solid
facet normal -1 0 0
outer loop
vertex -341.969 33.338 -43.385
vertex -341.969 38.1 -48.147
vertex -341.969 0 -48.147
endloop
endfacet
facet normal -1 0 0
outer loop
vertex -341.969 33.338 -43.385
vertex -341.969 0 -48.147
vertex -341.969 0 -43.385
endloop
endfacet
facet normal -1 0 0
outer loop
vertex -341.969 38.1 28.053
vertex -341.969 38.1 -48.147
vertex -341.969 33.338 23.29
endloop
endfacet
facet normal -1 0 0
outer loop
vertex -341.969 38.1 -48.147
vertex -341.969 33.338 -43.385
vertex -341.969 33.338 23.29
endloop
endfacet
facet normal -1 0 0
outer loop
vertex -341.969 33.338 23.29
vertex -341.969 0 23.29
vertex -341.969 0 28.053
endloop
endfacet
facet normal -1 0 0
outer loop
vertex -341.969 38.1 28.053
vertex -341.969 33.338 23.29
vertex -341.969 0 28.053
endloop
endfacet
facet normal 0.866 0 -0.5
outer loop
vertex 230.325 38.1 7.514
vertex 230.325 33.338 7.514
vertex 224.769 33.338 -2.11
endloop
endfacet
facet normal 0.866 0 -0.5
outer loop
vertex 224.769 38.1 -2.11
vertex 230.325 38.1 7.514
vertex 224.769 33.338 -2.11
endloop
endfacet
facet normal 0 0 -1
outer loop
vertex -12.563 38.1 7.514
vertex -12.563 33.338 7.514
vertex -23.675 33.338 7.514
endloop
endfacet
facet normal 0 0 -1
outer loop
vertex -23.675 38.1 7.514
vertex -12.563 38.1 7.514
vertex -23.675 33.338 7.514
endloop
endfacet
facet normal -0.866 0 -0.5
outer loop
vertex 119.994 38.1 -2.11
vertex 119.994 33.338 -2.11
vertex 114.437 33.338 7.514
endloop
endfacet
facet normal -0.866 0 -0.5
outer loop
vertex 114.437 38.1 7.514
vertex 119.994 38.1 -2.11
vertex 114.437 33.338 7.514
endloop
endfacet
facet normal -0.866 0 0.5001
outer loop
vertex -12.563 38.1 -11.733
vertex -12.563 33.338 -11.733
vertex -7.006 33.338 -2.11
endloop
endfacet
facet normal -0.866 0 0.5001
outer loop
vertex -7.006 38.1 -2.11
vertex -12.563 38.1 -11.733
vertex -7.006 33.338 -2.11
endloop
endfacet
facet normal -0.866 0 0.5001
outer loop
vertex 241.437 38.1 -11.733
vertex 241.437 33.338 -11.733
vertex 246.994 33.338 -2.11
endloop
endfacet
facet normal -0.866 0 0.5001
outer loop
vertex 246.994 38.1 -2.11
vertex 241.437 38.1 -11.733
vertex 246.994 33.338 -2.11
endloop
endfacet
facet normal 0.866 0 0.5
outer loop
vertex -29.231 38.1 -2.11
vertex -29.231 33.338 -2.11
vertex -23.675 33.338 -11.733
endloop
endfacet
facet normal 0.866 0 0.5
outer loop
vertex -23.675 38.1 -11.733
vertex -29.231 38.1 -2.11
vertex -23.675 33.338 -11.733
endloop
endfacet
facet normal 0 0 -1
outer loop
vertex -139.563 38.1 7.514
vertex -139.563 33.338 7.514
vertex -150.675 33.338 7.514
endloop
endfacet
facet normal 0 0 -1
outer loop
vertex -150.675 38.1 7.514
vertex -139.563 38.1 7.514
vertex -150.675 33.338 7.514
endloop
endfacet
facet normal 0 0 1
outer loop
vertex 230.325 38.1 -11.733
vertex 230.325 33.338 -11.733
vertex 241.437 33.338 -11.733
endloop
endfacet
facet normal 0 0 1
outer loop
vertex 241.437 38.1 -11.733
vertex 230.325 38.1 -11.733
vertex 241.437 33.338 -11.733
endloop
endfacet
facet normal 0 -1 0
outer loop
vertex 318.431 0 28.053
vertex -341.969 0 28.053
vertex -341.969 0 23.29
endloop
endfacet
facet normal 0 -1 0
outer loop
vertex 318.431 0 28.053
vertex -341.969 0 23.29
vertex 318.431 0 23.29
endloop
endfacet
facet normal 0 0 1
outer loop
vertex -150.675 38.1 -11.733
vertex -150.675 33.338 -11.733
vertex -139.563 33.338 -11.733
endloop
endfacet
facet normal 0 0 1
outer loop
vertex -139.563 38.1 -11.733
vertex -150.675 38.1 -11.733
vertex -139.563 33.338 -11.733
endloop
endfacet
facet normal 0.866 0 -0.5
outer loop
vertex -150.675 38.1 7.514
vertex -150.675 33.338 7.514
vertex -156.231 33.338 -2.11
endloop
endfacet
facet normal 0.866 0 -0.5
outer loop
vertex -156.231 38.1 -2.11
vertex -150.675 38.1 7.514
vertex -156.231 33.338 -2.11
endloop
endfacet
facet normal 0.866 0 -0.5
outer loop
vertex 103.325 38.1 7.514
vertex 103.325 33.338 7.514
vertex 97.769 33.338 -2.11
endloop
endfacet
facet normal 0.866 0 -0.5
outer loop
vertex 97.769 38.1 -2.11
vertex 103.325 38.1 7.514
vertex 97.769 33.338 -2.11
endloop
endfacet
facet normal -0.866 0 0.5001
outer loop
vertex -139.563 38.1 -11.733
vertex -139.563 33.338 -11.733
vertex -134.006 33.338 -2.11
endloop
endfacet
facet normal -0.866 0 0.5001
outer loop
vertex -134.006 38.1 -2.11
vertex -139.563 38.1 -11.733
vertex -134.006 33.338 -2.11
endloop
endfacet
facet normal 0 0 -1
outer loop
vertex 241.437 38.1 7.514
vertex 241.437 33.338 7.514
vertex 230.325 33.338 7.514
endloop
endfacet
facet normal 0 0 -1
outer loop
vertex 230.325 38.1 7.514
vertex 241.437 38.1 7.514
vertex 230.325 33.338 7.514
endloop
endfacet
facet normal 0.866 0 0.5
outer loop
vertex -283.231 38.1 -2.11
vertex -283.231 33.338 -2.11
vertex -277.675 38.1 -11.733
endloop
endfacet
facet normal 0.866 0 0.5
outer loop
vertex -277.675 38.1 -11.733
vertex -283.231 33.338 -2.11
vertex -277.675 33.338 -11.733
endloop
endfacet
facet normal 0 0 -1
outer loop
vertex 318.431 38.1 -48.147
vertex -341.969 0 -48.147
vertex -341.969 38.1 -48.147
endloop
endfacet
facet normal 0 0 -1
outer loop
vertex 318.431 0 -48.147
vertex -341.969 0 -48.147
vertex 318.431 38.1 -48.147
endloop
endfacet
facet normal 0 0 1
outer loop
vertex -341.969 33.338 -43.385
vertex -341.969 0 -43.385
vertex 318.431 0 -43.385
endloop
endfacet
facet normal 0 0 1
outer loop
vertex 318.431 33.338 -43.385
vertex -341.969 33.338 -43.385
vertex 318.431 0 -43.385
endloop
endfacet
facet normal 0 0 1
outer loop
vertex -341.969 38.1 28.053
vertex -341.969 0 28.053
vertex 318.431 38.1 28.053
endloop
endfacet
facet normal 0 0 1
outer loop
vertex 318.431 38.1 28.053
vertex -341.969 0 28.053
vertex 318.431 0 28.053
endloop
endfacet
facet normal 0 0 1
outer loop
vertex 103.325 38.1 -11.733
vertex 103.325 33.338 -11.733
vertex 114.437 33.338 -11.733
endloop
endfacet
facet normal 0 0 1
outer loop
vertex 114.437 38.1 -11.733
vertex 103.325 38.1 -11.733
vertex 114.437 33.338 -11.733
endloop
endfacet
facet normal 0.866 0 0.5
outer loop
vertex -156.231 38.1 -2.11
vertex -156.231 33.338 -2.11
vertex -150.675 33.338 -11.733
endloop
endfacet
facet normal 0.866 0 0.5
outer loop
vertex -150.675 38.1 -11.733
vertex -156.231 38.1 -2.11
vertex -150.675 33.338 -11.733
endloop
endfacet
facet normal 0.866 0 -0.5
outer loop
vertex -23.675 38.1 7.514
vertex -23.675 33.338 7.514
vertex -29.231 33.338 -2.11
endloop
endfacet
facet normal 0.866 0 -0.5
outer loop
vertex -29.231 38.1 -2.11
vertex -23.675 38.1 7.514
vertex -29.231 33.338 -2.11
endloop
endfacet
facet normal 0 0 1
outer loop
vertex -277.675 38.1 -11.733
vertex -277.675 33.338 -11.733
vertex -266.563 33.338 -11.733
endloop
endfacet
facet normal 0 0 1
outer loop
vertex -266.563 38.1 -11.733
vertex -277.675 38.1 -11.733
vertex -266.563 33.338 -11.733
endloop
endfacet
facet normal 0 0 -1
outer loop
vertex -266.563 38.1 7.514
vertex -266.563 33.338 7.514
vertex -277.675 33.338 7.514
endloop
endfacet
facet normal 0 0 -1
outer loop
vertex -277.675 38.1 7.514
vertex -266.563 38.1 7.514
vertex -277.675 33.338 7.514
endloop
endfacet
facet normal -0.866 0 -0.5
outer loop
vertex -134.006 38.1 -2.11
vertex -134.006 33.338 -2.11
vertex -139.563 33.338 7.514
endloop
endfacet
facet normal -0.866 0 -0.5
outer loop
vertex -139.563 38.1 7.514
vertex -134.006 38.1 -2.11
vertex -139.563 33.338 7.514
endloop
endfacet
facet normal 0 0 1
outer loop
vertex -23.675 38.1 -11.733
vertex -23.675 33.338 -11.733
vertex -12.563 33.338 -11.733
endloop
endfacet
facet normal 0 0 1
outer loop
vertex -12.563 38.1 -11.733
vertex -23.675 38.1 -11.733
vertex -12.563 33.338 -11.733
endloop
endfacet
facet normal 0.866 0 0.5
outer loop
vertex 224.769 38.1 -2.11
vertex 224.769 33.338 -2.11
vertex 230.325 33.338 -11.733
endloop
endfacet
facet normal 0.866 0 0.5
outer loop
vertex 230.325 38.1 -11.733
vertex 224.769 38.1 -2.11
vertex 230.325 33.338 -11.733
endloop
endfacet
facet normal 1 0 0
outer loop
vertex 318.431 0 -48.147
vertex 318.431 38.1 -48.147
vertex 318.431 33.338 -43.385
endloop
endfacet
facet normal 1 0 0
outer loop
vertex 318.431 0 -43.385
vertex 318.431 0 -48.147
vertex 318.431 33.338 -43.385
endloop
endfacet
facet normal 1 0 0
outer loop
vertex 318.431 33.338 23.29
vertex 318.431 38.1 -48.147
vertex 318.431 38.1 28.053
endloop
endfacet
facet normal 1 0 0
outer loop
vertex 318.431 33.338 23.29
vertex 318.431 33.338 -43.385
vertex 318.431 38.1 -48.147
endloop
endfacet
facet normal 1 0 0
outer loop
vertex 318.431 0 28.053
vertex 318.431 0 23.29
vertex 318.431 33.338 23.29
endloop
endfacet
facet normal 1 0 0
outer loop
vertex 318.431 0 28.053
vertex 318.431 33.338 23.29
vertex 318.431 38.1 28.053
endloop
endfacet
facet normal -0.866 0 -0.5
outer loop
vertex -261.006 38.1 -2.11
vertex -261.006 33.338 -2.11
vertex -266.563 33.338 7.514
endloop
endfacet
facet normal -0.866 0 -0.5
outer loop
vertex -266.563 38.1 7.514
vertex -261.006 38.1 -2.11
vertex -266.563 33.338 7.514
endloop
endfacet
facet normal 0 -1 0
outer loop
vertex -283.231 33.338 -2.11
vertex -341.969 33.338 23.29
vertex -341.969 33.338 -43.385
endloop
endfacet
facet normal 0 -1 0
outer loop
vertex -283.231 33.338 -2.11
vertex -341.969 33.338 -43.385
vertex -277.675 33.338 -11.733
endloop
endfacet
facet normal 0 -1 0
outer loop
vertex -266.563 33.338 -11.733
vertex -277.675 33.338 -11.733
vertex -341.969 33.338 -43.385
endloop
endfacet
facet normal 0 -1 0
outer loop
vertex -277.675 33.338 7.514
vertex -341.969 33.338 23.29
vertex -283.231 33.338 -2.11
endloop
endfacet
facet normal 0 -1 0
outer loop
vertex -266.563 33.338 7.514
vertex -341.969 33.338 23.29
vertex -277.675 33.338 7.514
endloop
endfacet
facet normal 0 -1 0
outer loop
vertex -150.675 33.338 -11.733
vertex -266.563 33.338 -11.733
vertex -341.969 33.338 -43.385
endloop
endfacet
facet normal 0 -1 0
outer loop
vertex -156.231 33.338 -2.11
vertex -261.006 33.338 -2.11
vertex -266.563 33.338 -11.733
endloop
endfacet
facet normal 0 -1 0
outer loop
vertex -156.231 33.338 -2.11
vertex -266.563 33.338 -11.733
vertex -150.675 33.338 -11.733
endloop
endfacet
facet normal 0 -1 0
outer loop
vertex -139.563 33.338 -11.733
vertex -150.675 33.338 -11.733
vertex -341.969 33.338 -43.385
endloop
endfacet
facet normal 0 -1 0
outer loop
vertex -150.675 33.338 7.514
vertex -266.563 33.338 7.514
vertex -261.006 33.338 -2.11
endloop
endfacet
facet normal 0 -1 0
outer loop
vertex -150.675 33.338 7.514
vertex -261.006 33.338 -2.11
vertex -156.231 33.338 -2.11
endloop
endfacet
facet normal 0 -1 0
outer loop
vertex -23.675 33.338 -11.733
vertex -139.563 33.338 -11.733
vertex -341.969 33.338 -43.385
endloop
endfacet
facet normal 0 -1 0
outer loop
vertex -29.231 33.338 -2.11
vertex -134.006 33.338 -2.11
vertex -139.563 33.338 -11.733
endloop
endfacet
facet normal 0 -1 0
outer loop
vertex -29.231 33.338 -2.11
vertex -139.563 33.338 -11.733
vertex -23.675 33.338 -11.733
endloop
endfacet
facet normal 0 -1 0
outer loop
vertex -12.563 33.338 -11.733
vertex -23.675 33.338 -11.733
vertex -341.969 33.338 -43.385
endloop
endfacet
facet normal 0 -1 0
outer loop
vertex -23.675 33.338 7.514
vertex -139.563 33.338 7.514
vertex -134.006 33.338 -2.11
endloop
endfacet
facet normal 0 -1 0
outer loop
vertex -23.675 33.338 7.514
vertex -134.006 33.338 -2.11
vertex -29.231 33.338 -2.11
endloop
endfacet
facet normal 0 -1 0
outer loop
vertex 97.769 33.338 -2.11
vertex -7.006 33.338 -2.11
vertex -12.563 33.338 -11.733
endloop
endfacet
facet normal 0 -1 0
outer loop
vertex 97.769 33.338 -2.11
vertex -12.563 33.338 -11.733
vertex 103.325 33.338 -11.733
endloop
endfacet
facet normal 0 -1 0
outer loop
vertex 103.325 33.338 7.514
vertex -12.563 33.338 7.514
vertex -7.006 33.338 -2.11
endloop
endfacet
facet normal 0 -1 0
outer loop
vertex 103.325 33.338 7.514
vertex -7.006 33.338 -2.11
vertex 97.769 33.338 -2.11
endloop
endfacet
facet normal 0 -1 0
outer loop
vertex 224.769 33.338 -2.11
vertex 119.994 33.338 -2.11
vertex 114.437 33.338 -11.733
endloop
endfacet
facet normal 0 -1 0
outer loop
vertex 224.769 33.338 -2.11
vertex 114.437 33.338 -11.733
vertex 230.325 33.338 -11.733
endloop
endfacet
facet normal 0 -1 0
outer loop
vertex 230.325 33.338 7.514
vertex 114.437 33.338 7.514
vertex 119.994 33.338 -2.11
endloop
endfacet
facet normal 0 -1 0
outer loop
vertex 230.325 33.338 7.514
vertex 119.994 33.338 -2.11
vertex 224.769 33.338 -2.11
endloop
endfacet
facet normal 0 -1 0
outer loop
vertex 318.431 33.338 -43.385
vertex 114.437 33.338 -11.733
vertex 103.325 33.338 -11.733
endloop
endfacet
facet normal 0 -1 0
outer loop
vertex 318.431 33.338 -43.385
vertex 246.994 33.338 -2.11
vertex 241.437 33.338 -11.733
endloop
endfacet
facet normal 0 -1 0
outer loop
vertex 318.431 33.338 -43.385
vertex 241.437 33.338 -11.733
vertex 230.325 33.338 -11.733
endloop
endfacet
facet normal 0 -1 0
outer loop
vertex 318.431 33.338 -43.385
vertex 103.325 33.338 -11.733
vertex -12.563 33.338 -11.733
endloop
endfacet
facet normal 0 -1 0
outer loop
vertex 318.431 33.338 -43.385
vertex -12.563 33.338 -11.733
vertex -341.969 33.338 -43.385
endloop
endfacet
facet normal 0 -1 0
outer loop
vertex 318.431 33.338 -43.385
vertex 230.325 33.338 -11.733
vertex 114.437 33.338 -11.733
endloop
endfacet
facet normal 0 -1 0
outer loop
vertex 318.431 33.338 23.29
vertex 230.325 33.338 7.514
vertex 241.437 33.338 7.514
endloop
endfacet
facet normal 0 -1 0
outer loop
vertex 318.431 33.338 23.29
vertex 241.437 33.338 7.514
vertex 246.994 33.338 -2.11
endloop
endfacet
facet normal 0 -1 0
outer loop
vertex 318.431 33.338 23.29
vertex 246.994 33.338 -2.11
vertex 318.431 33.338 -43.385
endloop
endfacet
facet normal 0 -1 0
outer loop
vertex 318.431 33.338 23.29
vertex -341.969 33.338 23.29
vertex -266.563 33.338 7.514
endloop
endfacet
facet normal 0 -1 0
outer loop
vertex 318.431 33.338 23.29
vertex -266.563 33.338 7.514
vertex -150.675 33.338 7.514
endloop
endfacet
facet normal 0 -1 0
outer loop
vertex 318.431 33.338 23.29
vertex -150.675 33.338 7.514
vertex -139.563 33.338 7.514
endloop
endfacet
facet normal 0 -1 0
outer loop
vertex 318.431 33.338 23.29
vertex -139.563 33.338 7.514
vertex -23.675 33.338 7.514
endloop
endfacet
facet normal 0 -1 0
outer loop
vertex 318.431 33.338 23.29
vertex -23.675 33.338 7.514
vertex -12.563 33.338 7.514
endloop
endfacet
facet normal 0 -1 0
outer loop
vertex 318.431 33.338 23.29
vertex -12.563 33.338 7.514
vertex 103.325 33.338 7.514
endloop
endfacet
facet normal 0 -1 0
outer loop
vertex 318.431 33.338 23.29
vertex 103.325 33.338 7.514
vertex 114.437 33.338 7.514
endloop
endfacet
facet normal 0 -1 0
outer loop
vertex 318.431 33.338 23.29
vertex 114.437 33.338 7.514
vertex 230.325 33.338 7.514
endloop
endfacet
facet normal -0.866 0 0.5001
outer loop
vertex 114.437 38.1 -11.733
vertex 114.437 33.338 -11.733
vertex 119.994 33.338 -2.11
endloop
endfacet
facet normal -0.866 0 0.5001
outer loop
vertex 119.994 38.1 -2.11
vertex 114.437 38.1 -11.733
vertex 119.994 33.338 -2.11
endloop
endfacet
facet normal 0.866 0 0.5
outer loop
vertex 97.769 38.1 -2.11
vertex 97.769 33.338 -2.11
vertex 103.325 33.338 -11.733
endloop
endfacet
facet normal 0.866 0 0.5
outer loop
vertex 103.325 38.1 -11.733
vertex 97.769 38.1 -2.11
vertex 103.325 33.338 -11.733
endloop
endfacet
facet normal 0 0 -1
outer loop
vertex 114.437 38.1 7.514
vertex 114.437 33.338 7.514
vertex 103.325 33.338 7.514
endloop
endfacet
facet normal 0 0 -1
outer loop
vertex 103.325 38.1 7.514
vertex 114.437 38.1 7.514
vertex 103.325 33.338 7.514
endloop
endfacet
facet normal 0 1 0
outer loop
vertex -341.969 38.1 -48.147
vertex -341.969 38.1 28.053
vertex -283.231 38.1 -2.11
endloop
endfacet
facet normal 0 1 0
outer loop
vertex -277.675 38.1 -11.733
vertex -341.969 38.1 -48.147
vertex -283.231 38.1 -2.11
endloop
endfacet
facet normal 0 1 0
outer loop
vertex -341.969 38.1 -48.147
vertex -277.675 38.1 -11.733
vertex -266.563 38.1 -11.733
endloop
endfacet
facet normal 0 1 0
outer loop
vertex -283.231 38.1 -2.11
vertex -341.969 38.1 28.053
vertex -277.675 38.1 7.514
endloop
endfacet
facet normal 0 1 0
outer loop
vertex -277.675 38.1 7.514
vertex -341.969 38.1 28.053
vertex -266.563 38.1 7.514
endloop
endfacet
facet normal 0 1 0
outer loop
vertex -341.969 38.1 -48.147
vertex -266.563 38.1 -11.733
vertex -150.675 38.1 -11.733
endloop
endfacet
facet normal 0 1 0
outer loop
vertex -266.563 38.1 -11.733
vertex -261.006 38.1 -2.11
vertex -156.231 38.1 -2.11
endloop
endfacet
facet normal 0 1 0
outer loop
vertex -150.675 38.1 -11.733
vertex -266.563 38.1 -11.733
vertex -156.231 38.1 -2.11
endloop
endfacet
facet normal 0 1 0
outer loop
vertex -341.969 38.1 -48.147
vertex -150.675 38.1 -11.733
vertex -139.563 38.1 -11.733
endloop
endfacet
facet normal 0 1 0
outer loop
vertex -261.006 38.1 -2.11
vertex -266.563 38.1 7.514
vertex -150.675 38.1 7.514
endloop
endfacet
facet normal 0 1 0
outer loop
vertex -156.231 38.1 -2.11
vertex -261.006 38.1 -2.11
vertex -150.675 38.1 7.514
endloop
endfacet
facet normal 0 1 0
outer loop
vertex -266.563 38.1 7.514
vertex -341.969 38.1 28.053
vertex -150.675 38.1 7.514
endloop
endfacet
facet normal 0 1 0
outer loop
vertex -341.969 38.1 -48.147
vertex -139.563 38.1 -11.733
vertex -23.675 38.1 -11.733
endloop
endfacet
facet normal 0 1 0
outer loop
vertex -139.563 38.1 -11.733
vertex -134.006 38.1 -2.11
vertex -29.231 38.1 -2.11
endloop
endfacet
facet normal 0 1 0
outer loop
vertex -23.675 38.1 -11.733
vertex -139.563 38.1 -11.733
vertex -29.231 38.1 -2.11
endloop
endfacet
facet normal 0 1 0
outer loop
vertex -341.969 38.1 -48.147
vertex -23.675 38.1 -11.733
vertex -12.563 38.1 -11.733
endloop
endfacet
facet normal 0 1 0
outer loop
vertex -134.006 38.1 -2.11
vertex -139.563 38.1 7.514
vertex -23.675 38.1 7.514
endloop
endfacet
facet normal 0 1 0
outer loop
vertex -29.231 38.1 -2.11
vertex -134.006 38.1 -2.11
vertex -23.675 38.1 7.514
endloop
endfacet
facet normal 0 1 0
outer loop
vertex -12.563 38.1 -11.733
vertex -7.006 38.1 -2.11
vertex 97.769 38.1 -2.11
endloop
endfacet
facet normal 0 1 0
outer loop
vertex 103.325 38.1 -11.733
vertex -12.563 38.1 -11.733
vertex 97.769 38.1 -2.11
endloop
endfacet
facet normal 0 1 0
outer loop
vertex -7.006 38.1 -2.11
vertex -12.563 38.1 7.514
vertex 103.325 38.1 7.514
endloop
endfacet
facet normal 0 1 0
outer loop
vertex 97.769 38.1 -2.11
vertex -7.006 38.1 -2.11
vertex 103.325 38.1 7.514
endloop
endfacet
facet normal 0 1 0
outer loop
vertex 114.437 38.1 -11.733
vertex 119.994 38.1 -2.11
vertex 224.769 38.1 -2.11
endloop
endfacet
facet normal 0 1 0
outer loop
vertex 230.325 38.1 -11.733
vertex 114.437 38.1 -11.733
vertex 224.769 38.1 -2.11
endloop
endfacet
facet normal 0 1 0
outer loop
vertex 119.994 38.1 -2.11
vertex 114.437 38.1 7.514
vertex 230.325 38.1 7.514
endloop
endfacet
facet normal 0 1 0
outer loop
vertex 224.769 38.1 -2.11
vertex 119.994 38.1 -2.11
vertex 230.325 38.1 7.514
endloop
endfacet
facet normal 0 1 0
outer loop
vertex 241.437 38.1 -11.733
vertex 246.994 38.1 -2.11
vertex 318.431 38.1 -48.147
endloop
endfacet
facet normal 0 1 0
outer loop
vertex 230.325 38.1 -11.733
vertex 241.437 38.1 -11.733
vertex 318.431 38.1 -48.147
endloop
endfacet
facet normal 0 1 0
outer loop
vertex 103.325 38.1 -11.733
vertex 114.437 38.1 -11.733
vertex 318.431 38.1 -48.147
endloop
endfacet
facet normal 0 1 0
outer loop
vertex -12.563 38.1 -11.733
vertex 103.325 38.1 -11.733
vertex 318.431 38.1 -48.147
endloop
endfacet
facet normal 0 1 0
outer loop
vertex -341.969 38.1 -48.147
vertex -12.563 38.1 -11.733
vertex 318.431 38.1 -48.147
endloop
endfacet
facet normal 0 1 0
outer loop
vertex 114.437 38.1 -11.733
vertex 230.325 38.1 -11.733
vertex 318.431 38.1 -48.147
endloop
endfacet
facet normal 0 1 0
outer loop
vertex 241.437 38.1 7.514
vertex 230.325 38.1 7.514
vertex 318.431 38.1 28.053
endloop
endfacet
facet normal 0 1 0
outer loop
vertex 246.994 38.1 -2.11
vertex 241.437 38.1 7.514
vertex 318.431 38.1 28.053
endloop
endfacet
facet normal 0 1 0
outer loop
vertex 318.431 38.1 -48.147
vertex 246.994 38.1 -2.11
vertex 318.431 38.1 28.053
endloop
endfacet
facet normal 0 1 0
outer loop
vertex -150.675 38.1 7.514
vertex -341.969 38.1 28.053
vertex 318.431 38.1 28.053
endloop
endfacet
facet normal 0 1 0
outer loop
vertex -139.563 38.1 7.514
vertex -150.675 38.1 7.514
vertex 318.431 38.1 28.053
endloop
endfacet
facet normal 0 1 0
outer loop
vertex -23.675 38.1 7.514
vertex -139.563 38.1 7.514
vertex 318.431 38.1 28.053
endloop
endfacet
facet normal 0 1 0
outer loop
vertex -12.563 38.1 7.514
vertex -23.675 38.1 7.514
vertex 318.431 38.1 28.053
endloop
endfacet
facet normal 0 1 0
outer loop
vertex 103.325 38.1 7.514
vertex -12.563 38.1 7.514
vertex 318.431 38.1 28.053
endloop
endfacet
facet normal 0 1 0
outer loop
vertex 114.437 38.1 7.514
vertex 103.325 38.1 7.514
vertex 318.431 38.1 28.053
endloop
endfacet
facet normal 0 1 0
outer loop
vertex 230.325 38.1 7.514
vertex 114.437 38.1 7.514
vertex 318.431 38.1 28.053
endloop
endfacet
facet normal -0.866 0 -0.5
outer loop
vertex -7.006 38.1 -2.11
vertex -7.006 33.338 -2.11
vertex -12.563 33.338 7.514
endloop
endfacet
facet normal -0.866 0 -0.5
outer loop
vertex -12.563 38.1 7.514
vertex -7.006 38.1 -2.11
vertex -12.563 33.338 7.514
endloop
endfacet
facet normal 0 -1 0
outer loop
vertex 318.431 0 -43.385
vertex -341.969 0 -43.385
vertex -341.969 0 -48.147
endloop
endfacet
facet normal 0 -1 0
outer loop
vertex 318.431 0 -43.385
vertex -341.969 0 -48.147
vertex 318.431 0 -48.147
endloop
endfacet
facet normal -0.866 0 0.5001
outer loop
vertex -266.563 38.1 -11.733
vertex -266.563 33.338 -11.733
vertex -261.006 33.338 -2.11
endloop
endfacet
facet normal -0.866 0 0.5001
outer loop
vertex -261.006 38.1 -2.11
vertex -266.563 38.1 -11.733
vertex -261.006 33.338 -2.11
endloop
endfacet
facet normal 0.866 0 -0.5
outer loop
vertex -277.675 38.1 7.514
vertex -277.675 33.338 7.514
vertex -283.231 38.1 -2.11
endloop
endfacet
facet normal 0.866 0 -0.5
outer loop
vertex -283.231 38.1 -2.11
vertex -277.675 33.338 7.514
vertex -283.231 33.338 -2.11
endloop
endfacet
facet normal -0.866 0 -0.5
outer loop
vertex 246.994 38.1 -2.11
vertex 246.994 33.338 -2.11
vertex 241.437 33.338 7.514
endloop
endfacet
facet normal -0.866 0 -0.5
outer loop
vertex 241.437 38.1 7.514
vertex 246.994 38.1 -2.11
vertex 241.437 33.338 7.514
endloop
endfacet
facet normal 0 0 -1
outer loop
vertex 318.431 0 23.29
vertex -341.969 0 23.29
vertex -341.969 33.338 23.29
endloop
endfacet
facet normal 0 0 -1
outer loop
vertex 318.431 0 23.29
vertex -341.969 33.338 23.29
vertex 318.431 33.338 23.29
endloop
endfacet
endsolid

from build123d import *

# Parameters (mm, degrees)
F0_W     = 660.4
F0_H     = 76.2
F1_DEPTH = 38.1
F2_W     = 660.4
F2_H     = 66.675
F3_DEPTH = 33.3375
F5_DEPTH = 25.4


with BuildPart() as f1:
    # F0 (on Front) → F1 (new body)
    with BuildSketch(Plane.XZ):
        with Locations((-11.768971, -10.047171)):
            Rectangle(F0_W, F0_H)
    extrude(amount=-F1_DEPTH)

    # F2 (on face) → F3 (cut)
    with BuildSketch(Plane.XZ):
        with Locations((-11.768971, -10.047171)):
            Rectangle(F2_W, F2_H)
    extrude(amount=-F3_DEPTH, mode=Mode.SUBTRACT)

    # F4 (on face) → F5 (cut)
    with BuildSketch(Plane.XZ.offset(-33.3375)):
        Polygon((-277.675221, 7.514036), (-283.231471, -2.109671), (-277.675221, -11.733378), (-266.562721, -11.733378), (-261.006471, -2.109671), (-266.562721, 7.514036), align=None)
        Polygon((-150.675221, 7.514036), (-156.231471, -2.109671), (-150.675221, -11.733378), (-139.562721, -11.733378), (-134.006471, -2.109671), (-139.562721, 7.514036), align=None)
        Polygon((-23.675221, 7.514036), (-29.231471, -2.109671), (-23.675221, -11.733378), (-12.562721, -11.733378), (-7.006471, -2.109671), (-12.562721, 7.514036), align=None)
        Polygon((103.324779, 7.514036), (97.768529, -2.109671), (103.324779, -11.733378), (114.437279, -11.733378), (119.993529, -2.109671), (114.437279, 7.514036), align=None)
        Polygon((230.324779, 7.514036), (224.768529, -2.109671), (230.324779, -11.733378), (241.437279, -11.733378), (246.993529, -2.109671), (241.437279, 7.514036), align=None)
    extrude(amount=-F5_DEPTH, mode=Mode.SUBTRACT)


solid = f1.part
